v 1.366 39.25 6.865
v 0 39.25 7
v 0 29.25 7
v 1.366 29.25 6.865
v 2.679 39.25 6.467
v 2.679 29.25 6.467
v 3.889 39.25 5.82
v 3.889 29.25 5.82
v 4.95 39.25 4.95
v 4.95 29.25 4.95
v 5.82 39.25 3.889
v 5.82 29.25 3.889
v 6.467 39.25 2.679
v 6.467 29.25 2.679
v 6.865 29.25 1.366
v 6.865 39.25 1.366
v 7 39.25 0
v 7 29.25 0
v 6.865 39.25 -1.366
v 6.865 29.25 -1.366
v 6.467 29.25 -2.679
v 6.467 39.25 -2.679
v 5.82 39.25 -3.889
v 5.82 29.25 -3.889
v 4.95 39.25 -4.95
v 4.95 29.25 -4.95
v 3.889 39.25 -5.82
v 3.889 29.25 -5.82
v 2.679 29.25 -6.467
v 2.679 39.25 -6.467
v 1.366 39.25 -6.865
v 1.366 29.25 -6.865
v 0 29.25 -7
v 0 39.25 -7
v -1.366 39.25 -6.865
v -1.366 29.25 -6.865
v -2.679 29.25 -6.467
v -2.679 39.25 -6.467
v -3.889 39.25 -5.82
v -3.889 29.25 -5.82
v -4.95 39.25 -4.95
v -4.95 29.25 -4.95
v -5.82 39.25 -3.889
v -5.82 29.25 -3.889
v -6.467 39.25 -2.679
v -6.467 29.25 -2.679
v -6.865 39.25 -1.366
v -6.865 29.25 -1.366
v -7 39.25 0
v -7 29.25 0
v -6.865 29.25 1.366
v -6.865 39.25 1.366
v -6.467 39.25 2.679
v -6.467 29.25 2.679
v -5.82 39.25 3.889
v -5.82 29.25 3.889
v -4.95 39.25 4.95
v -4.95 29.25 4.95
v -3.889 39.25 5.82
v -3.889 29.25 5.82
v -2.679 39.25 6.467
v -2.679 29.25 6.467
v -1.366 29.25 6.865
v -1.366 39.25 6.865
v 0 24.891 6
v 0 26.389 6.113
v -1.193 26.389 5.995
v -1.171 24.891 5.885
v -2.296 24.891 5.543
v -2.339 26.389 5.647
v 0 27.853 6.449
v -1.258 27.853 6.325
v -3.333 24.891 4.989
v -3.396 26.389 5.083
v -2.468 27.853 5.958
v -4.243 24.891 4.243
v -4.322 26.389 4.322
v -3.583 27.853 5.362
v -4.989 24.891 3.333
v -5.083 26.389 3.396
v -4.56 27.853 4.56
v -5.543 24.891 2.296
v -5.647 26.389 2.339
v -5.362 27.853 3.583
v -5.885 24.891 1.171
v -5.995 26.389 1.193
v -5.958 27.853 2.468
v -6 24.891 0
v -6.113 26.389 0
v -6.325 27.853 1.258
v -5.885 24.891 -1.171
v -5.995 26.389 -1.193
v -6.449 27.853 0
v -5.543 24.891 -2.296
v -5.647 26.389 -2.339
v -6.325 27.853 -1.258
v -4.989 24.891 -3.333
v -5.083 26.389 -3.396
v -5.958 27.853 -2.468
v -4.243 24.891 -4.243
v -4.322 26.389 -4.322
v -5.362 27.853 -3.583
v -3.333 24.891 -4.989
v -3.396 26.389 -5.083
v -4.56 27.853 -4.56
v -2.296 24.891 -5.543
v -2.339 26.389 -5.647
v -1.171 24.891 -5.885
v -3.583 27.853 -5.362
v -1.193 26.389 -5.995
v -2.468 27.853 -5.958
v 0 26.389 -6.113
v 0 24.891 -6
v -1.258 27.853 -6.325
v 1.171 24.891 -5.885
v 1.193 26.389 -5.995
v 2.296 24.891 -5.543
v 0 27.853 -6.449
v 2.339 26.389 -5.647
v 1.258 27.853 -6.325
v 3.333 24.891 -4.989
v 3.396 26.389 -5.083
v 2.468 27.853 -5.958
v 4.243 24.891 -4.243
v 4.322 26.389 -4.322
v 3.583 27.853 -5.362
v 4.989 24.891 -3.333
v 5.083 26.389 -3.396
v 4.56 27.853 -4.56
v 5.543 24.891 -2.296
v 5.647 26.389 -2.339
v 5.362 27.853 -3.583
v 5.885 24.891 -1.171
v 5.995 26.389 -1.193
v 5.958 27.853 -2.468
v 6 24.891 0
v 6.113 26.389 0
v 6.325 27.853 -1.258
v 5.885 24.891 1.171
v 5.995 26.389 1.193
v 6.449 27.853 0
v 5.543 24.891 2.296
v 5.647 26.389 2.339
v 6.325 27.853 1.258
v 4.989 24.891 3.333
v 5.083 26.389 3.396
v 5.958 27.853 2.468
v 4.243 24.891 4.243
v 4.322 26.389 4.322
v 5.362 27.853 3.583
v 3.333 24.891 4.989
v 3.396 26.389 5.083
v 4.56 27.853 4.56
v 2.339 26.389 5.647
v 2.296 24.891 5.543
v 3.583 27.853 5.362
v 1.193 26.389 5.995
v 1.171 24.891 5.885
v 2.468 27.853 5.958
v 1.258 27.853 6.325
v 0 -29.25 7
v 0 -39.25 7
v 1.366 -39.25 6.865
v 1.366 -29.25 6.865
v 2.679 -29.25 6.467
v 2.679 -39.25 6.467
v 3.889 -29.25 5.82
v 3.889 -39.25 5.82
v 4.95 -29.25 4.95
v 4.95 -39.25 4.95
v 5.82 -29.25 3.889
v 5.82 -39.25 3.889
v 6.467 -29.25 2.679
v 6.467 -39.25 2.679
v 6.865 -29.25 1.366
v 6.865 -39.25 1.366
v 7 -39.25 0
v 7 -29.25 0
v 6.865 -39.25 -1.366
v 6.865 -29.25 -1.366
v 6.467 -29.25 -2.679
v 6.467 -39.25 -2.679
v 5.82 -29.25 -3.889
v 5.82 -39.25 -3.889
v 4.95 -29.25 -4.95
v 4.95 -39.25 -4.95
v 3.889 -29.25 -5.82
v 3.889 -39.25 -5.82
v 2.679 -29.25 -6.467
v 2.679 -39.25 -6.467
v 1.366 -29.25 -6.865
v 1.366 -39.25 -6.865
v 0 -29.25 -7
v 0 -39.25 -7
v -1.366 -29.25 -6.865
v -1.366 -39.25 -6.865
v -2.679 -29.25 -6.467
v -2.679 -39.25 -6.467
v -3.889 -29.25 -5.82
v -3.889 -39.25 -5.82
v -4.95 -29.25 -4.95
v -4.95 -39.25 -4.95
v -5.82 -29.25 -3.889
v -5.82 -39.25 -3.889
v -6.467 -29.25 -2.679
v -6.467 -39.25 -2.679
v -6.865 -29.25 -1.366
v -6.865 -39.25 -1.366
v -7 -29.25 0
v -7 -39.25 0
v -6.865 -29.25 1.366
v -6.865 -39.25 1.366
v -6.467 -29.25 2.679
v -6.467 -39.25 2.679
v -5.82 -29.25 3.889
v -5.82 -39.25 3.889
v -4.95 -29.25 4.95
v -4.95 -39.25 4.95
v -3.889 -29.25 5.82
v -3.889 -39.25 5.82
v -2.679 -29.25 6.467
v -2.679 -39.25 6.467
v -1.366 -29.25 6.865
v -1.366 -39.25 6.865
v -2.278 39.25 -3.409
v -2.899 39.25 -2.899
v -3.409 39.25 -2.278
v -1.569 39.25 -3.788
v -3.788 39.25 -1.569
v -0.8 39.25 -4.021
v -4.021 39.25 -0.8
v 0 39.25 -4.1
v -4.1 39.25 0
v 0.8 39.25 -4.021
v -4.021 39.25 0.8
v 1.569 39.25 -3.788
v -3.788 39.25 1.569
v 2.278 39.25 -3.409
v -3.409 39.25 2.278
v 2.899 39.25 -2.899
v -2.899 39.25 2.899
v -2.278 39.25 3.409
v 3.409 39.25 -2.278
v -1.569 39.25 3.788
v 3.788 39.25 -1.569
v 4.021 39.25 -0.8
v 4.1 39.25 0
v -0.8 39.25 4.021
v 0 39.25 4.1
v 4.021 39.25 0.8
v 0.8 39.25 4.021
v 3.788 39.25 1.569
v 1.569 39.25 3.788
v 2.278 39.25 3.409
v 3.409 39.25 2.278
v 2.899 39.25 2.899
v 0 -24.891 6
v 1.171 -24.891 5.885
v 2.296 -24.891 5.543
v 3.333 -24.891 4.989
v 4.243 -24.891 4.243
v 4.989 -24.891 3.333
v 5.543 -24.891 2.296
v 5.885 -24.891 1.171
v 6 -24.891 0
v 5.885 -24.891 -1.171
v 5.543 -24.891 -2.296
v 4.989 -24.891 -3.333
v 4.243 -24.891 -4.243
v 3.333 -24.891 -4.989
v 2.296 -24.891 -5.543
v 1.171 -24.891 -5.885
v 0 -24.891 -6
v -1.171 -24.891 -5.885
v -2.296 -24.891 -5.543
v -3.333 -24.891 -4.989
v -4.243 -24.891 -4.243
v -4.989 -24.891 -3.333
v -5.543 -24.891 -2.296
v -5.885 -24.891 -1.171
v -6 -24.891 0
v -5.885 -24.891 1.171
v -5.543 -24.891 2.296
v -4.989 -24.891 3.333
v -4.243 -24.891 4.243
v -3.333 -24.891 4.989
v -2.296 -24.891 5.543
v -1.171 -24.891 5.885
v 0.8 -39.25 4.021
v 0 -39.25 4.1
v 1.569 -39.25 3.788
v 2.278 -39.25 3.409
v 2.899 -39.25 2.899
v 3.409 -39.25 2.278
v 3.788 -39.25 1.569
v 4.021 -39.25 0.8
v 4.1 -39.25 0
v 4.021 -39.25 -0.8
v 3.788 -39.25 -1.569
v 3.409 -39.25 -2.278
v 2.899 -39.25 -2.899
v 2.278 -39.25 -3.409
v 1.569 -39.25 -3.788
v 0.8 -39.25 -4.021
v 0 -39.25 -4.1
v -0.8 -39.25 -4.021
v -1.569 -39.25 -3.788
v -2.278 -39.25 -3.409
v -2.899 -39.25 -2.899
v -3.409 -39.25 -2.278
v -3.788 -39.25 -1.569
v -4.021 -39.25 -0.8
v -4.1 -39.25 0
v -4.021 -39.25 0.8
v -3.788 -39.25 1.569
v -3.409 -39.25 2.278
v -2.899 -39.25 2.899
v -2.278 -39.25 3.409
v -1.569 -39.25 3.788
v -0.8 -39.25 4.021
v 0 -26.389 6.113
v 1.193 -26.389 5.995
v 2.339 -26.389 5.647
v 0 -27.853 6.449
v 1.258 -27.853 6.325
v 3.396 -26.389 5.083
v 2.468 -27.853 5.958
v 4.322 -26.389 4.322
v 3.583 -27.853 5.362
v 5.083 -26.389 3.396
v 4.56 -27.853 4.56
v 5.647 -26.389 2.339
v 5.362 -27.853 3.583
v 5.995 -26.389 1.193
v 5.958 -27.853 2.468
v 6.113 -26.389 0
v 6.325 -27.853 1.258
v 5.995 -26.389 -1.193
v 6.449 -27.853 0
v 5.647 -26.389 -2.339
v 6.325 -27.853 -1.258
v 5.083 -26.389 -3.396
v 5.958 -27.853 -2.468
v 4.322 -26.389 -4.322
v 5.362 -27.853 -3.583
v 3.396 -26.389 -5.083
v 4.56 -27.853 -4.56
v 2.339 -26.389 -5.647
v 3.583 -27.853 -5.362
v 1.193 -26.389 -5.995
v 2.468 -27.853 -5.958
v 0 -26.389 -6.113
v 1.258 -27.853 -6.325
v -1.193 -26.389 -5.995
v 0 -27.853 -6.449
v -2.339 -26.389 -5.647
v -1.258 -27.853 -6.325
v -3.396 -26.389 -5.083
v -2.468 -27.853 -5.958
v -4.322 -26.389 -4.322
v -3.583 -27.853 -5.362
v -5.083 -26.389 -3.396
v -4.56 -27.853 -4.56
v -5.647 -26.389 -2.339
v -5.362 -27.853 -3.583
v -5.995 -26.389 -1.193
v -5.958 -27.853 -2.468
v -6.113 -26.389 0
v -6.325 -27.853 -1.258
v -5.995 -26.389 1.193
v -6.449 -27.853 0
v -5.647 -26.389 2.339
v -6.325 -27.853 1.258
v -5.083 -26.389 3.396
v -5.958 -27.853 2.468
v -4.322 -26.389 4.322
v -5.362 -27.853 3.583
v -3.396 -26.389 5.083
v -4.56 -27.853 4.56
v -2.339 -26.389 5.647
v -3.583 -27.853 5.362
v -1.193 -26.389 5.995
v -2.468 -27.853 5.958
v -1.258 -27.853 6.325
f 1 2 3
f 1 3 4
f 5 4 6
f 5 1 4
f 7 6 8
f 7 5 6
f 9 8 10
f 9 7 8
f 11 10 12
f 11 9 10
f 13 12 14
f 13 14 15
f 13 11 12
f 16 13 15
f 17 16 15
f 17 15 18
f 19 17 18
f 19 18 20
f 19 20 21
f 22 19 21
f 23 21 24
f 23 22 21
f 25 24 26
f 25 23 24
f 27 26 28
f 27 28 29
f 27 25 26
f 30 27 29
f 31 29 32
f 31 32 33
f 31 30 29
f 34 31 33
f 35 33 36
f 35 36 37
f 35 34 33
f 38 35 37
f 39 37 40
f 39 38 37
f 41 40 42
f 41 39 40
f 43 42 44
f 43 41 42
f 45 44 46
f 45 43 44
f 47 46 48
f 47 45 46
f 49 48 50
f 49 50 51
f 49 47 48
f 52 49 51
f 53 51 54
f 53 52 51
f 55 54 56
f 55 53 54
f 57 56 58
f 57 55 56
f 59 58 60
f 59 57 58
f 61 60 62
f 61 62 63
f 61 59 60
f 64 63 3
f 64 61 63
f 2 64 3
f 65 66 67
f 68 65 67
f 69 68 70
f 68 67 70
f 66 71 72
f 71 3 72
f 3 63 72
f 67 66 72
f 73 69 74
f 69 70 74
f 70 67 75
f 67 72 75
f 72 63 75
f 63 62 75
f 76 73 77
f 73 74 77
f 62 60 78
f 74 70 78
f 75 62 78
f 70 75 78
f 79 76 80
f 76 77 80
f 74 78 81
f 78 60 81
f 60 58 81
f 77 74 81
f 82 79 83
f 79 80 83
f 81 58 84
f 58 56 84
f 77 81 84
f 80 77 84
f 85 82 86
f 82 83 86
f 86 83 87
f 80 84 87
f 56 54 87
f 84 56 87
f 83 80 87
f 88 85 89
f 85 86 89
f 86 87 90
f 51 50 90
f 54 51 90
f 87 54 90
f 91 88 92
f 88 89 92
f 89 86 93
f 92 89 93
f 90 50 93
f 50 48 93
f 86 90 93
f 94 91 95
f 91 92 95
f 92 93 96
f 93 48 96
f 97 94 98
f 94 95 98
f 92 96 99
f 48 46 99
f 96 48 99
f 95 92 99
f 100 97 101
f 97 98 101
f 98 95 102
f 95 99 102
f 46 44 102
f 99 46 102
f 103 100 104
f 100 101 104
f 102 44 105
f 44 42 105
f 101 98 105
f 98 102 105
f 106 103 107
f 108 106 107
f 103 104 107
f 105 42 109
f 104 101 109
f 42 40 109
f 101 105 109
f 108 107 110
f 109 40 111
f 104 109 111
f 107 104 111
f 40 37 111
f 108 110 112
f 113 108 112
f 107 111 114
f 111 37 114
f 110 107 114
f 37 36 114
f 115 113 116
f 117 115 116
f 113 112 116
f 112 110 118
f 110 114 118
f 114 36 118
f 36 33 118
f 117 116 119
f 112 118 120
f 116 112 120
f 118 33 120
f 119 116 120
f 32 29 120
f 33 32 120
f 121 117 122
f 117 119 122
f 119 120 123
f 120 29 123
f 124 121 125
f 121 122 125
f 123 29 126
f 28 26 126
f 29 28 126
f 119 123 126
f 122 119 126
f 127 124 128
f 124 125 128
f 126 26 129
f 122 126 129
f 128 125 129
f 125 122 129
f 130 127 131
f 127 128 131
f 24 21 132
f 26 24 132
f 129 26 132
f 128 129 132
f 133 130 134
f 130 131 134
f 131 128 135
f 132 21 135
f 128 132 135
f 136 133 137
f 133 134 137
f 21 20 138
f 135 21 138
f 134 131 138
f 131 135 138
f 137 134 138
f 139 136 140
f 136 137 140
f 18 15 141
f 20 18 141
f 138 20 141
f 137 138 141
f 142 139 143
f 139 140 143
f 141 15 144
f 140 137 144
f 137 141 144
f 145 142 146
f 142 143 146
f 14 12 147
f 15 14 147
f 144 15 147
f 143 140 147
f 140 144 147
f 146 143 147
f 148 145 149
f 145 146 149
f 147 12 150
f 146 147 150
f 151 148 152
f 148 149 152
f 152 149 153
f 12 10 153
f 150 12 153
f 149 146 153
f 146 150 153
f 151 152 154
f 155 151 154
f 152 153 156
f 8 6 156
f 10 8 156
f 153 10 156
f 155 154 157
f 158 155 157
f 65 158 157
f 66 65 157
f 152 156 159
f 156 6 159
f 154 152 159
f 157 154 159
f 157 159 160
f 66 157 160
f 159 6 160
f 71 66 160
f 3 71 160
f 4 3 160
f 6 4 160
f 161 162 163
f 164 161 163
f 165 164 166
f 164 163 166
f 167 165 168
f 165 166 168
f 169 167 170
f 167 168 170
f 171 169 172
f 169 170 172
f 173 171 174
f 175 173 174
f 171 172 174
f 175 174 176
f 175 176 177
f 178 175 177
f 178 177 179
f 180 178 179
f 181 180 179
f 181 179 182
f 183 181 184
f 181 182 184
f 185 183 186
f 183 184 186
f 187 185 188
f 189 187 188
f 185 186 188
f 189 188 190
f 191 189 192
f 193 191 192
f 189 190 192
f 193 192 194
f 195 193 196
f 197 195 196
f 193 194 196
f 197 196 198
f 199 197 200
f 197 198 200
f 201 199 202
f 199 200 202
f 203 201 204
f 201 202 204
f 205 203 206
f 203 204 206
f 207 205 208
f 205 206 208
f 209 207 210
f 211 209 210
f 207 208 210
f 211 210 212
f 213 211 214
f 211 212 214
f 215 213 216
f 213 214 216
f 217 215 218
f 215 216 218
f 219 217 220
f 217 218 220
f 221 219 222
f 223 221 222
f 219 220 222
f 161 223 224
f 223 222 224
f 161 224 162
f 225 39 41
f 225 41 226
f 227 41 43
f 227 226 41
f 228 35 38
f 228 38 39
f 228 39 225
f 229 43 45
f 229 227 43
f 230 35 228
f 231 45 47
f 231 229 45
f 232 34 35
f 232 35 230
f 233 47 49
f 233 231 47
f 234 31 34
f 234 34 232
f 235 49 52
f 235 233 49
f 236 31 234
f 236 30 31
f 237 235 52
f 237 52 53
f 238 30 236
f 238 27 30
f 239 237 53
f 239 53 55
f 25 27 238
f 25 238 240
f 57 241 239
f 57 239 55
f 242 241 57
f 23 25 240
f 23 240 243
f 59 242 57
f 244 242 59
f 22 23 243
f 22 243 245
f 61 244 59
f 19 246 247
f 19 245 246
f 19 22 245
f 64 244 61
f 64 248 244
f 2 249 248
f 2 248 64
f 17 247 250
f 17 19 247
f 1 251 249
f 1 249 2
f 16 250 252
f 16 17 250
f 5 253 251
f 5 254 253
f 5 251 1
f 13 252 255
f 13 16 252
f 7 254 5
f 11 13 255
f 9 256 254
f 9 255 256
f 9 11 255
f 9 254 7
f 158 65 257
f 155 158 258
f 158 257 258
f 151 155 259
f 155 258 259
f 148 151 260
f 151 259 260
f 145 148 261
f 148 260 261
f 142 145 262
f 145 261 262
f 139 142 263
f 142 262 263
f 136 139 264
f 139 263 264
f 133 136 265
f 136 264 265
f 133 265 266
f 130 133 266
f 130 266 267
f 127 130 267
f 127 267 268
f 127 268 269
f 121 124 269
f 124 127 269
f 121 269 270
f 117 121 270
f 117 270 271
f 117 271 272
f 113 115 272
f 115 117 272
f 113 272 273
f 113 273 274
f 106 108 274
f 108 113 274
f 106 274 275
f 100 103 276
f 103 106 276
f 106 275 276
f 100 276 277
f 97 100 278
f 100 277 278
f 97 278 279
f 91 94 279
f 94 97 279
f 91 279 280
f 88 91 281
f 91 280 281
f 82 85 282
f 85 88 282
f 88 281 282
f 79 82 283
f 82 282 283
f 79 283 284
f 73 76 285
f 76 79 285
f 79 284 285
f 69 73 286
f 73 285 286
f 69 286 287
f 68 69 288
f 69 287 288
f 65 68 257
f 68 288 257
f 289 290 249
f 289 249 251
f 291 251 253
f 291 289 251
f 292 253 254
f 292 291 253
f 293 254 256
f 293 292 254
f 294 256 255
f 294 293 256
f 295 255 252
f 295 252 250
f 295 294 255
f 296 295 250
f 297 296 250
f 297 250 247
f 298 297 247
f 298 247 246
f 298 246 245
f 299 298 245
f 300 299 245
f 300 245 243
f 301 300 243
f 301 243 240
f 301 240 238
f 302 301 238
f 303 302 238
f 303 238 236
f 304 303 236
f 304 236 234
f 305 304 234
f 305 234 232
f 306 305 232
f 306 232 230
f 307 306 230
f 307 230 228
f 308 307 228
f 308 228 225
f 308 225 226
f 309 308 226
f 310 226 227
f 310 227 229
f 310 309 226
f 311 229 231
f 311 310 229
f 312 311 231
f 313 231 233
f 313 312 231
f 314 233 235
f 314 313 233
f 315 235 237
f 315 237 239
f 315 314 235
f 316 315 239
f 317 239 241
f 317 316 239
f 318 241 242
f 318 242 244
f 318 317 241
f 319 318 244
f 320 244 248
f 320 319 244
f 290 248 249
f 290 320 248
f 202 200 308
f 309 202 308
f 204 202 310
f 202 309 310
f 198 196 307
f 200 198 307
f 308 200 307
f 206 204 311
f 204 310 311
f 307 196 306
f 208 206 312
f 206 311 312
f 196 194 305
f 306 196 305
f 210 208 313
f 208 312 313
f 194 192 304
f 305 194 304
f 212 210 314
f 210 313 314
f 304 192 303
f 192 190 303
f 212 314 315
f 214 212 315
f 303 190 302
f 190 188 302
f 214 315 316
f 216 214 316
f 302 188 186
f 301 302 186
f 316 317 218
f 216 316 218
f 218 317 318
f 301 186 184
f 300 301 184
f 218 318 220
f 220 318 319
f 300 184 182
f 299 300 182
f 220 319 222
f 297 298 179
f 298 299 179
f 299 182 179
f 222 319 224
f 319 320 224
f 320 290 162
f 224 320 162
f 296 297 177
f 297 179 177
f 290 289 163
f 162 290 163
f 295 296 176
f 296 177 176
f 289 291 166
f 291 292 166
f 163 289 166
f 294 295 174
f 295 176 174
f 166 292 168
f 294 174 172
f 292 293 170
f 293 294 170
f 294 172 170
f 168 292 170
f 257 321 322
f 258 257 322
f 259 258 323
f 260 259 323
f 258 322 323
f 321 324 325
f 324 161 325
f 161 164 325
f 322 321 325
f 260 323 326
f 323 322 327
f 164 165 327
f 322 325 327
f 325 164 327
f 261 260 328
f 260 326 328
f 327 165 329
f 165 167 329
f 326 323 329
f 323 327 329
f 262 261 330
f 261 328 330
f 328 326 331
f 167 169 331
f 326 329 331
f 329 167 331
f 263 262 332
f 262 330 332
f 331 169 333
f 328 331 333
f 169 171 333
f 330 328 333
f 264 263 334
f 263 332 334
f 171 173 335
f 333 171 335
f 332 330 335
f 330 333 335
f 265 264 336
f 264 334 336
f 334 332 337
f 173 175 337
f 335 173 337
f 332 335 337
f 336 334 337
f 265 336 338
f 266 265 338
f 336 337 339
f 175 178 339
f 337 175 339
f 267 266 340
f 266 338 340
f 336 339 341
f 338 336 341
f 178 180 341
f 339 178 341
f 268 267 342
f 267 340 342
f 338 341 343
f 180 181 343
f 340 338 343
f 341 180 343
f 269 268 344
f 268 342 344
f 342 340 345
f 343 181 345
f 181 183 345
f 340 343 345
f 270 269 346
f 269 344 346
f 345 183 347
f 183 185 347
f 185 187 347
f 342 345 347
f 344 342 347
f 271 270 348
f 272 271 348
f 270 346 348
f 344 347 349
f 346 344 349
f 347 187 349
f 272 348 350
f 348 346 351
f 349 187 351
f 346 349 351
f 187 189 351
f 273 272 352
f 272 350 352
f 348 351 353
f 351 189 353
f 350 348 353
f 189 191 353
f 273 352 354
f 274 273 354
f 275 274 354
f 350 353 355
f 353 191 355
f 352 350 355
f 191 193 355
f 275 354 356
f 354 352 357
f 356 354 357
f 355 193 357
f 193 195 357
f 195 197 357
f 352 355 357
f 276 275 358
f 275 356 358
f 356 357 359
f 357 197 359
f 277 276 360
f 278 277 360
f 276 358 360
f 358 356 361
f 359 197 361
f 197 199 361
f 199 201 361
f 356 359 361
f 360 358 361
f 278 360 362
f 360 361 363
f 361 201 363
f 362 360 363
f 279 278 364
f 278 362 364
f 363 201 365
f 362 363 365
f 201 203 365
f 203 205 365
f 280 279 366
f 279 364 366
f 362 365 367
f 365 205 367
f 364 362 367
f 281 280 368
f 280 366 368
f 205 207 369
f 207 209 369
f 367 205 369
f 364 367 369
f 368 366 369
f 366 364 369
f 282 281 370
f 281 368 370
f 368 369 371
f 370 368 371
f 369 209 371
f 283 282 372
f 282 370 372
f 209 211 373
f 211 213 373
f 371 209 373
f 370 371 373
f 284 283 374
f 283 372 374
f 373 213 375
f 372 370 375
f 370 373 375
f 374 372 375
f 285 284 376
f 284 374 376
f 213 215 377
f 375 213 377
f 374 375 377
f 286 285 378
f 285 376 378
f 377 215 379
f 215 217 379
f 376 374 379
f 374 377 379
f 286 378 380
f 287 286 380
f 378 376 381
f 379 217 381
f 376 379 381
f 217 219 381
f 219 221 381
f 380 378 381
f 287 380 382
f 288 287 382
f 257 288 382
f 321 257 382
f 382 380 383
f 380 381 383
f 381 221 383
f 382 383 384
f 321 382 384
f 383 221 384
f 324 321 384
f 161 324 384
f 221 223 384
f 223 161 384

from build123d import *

# Parameters (mm, degrees)
Y_KSEKLIK_EKSTR_ZYON1_DEPTH      = 39.25
Y_KSEKLIK_EKSTR_ZYON1_DEPTH_BACK = 39.25
IZIM1_R                          = 6
IZIM1_R_2                        = 4.1
IZIM2_R                          = 7
IZIM2_R_2                        = 4.1
Y_KSEKLIK_EKSTR_ZYON2_DEPTH      = 10
RADYUS1_R                        = 10


with BuildPart() as part:
    # Çizim1 → Yükseklik-Ekstrüzyon1 (new, two sides: drawn at the far end of the back side and taken through both)
    with BuildSketch(Plane(origin=(0, 0, 0), x_dir=(1, 0, 0), z_dir=(0, 1, 0)).offset(-Y_KSEKLIK_EKSTR_ZYON1_DEPTH_BACK)):
        with Locations(Location((0, 0, 0), (0, 0, 270))):
            Circle(IZIM1_R)
        with Locations(Location((0, 0, 0), (0, 0, 270))):
            Circle(IZIM1_R_2, mode=Mode.SUBTRACT)
    extrude(amount=Y_KSEKLIK_EKSTR_ZYON1_DEPTH + Y_KSEKLIK_EKSTR_ZYON1_DEPTH_BACK)

    # Çizim2 → Yükseklik-Ekstrüzyon2 (add)
    with BuildSketch(Plane(origin=(0, 39.25, 0), x_dir=(1, 0, 0), z_dir=(0, 1, 0))):
        with Locations(Location((0, 0, 0), (0, 0, 270))):
            Circle(IZIM2_R)
        with Locations(Location((0, 0, 0), (0, 0, 270))):
            Circle(IZIM2_R_2, mode=Mode.SUBTRACT)
    y_kseklik_ekstr_zyon2 = extrude(amount=-Y_KSEKLIK_EKSTR_ZYON2_DEPTH)

    # Aynalama1: Yükseklik-Ekstrüzyon2 across plane
    add(y_kseklik_ekstr_zyon2.mirror(Plane.ZX))

    # Radyus1
    # the kernel refuses this fillet: 10 mm, written as the material it adds along each edge
    with BuildSketch(Plane(origin=(0, 29.25, 0), x_dir=(0, 0, 1), z_dir=(1, 0, 0))) as radyus1_piece_1:
        with BuildLine():
            CenterArc((16, 4.358898944), RADYUS1_R, 180, 25.841932763)
            Line((7, 0), (6.82, -0.087177979))
            ThreePointArc((6.82, -0.087177979), (6.5, -0.2), (6, -0.2))
            Line((6, -0.2), (5.8, 0))
            Line((5.8, 0), (5.8, 4.358898944))
            Line((5.8, 4.358898944), (6, 4.358898944))
        make_face()
    revolve(axis=Axis((0, 29.25, 0), (0, -1, 0)))
    with BuildSketch(Plane(origin=(0, -29.25, 0), x_dir=(0, 0, 1), z_dir=(-1, 0, 0))) as radyus1_piece_2:
        with BuildLine():
            CenterArc((16, 4.358898944), RADYUS1_R, 180, 25.841932763)
            Line((7, 0), (6.82, -0.087177979))
            ThreePointArc((6.82, -0.087177979), (6.5, -0.2), (6, -0.2))
            Line((6, -0.2), (5.8, 0))
            Line((5.8, 0), (5.8, 4.358898944))
            Line((5.8, 4.358898944), (6, 4.358898944))
        make_face()
    revolve(axis=Axis((0, -29.25, 0), (0, 1, 0)))


solid = part.part
